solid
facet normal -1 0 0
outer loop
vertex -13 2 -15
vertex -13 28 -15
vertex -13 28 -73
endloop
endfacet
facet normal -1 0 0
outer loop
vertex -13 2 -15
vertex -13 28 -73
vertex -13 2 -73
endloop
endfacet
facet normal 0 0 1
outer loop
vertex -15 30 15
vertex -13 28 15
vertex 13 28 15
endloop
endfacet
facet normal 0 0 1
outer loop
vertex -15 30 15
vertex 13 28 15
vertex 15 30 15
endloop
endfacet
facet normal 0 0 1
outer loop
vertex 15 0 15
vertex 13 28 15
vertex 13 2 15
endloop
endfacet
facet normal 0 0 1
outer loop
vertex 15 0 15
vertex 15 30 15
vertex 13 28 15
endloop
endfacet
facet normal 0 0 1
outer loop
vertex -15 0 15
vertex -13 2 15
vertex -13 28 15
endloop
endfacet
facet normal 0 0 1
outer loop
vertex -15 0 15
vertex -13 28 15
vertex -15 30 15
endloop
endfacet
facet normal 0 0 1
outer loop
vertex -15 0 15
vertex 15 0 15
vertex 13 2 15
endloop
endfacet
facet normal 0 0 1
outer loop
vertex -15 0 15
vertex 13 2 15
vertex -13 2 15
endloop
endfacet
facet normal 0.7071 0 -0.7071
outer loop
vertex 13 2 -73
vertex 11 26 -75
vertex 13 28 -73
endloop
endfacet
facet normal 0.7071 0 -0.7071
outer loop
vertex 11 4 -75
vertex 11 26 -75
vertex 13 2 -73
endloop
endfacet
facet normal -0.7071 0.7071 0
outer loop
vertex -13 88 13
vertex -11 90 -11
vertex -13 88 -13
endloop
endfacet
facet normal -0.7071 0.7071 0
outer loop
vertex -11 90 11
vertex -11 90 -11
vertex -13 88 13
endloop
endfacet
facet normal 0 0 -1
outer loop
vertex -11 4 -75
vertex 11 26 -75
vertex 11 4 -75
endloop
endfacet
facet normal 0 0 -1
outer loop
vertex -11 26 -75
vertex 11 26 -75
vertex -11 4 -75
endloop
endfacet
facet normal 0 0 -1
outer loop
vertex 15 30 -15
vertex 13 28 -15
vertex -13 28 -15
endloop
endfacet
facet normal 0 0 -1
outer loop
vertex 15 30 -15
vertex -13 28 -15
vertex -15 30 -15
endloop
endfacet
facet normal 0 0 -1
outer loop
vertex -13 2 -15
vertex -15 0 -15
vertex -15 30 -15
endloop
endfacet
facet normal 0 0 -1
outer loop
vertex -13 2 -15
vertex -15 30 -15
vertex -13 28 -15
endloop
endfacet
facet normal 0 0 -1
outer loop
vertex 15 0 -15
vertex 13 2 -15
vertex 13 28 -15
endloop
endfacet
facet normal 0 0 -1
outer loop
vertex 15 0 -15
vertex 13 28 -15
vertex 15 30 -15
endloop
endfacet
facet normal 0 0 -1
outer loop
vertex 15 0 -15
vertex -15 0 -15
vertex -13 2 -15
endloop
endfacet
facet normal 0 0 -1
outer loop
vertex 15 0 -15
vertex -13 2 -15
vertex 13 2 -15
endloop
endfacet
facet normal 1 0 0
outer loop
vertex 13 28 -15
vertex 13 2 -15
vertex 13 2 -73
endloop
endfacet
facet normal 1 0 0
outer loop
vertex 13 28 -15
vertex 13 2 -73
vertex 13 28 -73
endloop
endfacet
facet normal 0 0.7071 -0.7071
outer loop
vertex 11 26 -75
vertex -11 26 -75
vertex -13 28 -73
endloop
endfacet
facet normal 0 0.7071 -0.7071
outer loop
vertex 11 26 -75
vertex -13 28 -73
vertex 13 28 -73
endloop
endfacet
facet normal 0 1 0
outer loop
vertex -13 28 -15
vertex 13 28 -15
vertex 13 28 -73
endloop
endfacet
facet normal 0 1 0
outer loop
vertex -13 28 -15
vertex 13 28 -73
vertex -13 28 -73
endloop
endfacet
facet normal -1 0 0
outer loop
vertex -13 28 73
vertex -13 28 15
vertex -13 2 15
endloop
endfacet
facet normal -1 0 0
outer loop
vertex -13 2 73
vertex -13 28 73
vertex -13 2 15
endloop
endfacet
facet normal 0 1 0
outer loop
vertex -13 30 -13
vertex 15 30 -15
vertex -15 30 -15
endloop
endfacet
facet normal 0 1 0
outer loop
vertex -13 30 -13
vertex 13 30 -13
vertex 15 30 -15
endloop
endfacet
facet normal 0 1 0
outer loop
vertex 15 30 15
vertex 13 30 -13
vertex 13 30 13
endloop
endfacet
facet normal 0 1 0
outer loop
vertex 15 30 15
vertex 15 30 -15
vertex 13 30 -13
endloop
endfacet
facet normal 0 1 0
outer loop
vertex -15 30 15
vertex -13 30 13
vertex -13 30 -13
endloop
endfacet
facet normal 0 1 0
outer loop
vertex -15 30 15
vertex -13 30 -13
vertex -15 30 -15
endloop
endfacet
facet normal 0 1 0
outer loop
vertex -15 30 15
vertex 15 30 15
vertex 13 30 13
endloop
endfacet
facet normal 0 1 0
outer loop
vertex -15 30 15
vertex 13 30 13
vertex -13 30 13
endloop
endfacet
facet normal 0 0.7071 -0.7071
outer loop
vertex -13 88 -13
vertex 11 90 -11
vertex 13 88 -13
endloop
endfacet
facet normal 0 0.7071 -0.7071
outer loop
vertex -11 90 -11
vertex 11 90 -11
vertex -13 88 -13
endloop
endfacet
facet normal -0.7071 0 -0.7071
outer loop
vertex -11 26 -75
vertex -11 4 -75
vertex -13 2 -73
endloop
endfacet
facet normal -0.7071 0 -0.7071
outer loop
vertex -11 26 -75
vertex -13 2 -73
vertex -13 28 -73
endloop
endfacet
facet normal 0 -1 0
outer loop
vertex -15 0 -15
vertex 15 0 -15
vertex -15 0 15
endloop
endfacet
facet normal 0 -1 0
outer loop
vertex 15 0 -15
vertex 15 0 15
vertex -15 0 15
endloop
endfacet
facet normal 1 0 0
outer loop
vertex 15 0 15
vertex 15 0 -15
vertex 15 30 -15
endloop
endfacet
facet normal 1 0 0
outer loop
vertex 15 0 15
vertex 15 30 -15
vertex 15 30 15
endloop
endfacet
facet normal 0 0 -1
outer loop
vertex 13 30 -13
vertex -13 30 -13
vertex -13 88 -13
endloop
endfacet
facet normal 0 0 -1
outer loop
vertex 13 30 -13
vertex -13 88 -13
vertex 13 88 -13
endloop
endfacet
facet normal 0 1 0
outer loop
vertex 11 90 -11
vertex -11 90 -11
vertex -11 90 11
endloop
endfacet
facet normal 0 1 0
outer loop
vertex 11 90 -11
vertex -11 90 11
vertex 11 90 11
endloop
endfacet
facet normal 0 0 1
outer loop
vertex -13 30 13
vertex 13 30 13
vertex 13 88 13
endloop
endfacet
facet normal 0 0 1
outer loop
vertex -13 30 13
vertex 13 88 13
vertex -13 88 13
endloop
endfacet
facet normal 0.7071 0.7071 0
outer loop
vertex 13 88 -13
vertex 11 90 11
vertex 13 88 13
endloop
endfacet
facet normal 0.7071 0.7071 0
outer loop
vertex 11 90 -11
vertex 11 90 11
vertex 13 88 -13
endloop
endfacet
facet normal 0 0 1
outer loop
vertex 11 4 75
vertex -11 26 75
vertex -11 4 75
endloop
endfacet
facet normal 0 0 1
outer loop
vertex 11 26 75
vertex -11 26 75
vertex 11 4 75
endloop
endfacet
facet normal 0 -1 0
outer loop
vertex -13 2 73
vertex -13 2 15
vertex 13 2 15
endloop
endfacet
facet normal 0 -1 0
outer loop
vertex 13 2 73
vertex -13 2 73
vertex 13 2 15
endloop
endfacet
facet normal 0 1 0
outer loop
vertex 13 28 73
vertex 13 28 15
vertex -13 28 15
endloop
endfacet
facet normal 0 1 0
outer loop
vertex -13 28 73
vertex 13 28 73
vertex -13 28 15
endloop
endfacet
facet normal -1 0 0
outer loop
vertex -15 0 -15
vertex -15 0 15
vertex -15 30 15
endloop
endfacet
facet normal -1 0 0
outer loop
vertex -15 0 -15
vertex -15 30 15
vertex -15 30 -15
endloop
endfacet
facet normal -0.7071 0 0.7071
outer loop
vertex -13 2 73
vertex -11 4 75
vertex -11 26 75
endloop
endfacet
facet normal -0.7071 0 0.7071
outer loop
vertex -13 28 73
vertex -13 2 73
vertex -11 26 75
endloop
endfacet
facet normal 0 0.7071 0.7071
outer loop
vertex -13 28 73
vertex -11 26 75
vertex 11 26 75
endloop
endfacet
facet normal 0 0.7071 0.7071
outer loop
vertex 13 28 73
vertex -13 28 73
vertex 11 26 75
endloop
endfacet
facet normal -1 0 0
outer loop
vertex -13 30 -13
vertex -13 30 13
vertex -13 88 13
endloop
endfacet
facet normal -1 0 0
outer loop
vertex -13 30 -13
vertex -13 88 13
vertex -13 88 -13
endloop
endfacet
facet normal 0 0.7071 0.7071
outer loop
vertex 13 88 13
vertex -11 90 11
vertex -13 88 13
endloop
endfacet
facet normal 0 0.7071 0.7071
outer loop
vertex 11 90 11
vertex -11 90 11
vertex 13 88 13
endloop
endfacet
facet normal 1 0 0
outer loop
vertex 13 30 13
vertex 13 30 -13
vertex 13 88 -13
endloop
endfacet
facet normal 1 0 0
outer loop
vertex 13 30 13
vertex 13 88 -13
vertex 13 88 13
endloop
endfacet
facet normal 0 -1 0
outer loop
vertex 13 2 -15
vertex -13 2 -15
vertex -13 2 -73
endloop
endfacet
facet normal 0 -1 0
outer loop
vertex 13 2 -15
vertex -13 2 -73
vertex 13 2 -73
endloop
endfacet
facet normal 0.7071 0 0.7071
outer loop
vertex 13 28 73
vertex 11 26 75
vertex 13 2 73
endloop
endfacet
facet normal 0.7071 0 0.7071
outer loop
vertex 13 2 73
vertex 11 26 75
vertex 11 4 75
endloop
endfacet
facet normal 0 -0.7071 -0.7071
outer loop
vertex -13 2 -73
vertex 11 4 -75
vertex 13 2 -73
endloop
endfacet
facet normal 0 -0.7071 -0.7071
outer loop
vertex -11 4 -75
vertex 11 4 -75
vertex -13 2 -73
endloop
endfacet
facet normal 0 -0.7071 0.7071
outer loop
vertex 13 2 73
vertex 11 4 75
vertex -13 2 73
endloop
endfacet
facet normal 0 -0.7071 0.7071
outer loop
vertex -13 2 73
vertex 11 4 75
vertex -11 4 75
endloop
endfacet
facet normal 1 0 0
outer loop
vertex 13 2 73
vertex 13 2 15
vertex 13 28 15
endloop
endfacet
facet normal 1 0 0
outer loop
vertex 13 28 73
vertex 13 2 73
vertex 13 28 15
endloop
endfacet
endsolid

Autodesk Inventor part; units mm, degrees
ref_plane "YZ Plane" through (0, 0, 0) normal (1, 0, 0) x (0, 1, 0)
ref_plane "XZ Plane" through (0, 0, 0) normal (0, 1, 0) x (-1, 0, 0)
ref_plane "XY Plane" through (0, 0, 0) normal (0, 0, 1) x (1, 0, 0)
sketch "Náčrt8" plane through (0, 0, 0) normal (0, 1, 0) x (-1, 0, 0)
  line L0 (-15, 15) -> (15, 15)
  line L1 (15, 15) -> (15, -15)
  line L2 (15, -15) -> (-15, -15)
  line L3 (-15, -15) -> (-15, 15)
  line L4 (-15, 15) -> (15, -15) construction
  line L5 (15, 15) -> (-15, -15) construction
  point P0 (0, 0)
  dimension "d67" = 30
  dimension "d68" = 30
extrude "Vysunutí8" add sketch "Náčrt8" along normal blind 30
sketch "Náčrt9" plane through (0, 30, 0) normal (0, 1, 0) x (1, 0, 0)
  line L0 (13, -13) -> (-13, -13)
  line L1 (-13, -13) -> (-13, 13)
  line L2 (-13, 13) -> (13, 13)
  line L3 (13, 13) -> (13, -13)
  line L4 (13, -13) -> (-13, 13) construction
  line L5 (-13, -13) -> (13, 13) construction
  point P0 (0, 0)
  dimension "d71" = 26
  dimension "d72" = 26
extrude "Vysunutí9" add sketch "Náčrt9" along normal blind 60
sketch "Náčrt10" plane through (-15, 0, -15) normal (-1, 0, 0) x (0, 0, 1)
  line L0 (30, 0) -> (0, 0) projected
  line L1 (30, 0) -> (30, 30) projected
  line L2 (0, 30) -> (30, 30) projected
  line L3 (0, 0) -> (0, 30) projected
  line L4 (28, 2) -> (2, 2)
  line L5 (2, 2) -> (2, 28)
  line L6 (2, 28) -> (28, 28)
  line L7 (28, 28) -> (28, 2)
  line L8 (28, 2) -> (2, 28) construction
  line L9 (2, 2) -> (28, 28) construction
  point P0 (15, 0)
  point P1 (7.5, 15)
  point P2 (15, 15)
  dimension "d79" = 26
  dimension "d80" = 26
  dimension "d120" = 15
  dimension "d121" = 15
sketch "Náčrt11" plane through (15, 0, -15) normal (0, 0, -1) x (-1, 0, 0)
  line L0 (30, 0) -> (0, 0) projected
  line L1 (30, 0) -> (30, 30) projected
  line L2 (0, 30) -> (30, 30) projected
  line L3 (0, 0) -> (0, 30) projected
  line L4 (28, 2) -> (2, 2)
  line L5 (2, 2) -> (2, 28)
  line L6 (2, 28) -> (28, 28)
  line L7 (28, 28) -> (28, 2)
  line L8 (28, 2) -> (2, 28) construction
  line L9 (2, 2) -> (28, 28) construction
  point P0 (15, 0)
  point P1 (15, 15)
  dimension "d87" = 26
  dimension "d88" = 26
  dimension "d122" = 15
  dimension "d123" = 15
sketch "Náčrt12" plane through (15, 0, 15) normal (1, 0, 0) x (0, 0, -1)
  line L0 (2, 2) -> (28, 2) projected
  line L1 (28, 28) -> (2, 28) projected
  line L2 (28, 2) -> (28, 28) projected
  line L3 (2, 28) -> (2, 2) projected
  point P0 (15, 0)
sketch "Náčrt13" plane through (0, 0, 0) normal (0, -1, 0) x (1, 0, 0)
  line L0 (13, -13) -> (13, 13) projected
  line L1 (-13, -13) -> (13, -13) projected
  line L2 (-15, 15) -> (15, 15) projected
  line L3 (13, 13) -> (-13, 13) projected
  line L4 (-13, 13) -> (-13, -13) projected
sketch "Náčrt14" plane through (-15, 0, 15) normal (0, 0, 1) x (1, 0, 0)
  line L0 (28, 28) -> (2, 28) projected
  line L1 (2, 28) -> (2, 2) projected
  line L2 (2, 2) -> (28, 2) projected
  line L3 (28, 2) -> (28, 28) projected
  point P0 (15, 0)
extrude "Vysunutí10" add sketch "Náčrt11" along normal blind 60 contours L4 L5 L6 L7
extrude "Vysunutí11" add sketch "Náčrt14" along normal blind 60
extrude "Vysunutí12" [suppressed]
extrude "Vysunutí13" [suppressed]
extrude "Vysunutí14" [suppressed]
chamfer "Zkosení13" [suppressed]
chamfer "Zkosení14" distance 2 angle 45 4 edges at (13, 15, -75) (-13, 15, -75) (0, 28, -75) (0, 2, -75)
chamfer "Zkosení15" [suppressed]
chamfer "Zkosení16" distance 2 angle 45 4 edges at (-13, 15, 75) (13, 15, 75) (0, 28, 75) (0, 2, 75)
chamfer "Zkosení17" distance 2 angle 45 4 edges at (-13, 90, 0) (0, 90, -13) (13, 90, 0) (0, 90, 13)
chamfer "Zkosení18" [suppressed]
equation "\"d67\" = width"
equation "\"d68\" = width"
equation "\"d69\" = width"
equation "\"d71\" = width - 2 * thickness"
equation "\"d72\" = width - 2 * thickness"
equation "\"d75\" = 2 * width"
equation "\"d79\" = width - 2 * thickness"
equation "\"d80\" = width - 2 * thickness"
equation "\"d120\" = 0.5 * width"
equation "\"d121\" = 0.5 * width"
equation "\"d87\" = width - 2 * thickness"
equation "\"d88\" = width - 2 * thickness"
equation "\"d122\" = 0.5 * width"
equation "\"d123\" = 0.5 * width"
equation "\"d89\" = 2 * width"
equation "\"d91\" = 2 * width"
equation "\"d93\" = 2 * width"
equation "\"d95\" = 2 * width"
equation "\"d97\" = 2 * width"
equation "\"d99\" = thickness"
equation "\"d102\" = thickness"
equation "\"d105\" = thickness"
equation "\"d108\" = thickness"
equation "\"d111\" = thickness"
equation "\"d114\" = thickness"
equation "\"width\" = 30"
equation "\"thickness\" = 2"
properties part number "Profile-Connector#04" material "PVC potrubí"
